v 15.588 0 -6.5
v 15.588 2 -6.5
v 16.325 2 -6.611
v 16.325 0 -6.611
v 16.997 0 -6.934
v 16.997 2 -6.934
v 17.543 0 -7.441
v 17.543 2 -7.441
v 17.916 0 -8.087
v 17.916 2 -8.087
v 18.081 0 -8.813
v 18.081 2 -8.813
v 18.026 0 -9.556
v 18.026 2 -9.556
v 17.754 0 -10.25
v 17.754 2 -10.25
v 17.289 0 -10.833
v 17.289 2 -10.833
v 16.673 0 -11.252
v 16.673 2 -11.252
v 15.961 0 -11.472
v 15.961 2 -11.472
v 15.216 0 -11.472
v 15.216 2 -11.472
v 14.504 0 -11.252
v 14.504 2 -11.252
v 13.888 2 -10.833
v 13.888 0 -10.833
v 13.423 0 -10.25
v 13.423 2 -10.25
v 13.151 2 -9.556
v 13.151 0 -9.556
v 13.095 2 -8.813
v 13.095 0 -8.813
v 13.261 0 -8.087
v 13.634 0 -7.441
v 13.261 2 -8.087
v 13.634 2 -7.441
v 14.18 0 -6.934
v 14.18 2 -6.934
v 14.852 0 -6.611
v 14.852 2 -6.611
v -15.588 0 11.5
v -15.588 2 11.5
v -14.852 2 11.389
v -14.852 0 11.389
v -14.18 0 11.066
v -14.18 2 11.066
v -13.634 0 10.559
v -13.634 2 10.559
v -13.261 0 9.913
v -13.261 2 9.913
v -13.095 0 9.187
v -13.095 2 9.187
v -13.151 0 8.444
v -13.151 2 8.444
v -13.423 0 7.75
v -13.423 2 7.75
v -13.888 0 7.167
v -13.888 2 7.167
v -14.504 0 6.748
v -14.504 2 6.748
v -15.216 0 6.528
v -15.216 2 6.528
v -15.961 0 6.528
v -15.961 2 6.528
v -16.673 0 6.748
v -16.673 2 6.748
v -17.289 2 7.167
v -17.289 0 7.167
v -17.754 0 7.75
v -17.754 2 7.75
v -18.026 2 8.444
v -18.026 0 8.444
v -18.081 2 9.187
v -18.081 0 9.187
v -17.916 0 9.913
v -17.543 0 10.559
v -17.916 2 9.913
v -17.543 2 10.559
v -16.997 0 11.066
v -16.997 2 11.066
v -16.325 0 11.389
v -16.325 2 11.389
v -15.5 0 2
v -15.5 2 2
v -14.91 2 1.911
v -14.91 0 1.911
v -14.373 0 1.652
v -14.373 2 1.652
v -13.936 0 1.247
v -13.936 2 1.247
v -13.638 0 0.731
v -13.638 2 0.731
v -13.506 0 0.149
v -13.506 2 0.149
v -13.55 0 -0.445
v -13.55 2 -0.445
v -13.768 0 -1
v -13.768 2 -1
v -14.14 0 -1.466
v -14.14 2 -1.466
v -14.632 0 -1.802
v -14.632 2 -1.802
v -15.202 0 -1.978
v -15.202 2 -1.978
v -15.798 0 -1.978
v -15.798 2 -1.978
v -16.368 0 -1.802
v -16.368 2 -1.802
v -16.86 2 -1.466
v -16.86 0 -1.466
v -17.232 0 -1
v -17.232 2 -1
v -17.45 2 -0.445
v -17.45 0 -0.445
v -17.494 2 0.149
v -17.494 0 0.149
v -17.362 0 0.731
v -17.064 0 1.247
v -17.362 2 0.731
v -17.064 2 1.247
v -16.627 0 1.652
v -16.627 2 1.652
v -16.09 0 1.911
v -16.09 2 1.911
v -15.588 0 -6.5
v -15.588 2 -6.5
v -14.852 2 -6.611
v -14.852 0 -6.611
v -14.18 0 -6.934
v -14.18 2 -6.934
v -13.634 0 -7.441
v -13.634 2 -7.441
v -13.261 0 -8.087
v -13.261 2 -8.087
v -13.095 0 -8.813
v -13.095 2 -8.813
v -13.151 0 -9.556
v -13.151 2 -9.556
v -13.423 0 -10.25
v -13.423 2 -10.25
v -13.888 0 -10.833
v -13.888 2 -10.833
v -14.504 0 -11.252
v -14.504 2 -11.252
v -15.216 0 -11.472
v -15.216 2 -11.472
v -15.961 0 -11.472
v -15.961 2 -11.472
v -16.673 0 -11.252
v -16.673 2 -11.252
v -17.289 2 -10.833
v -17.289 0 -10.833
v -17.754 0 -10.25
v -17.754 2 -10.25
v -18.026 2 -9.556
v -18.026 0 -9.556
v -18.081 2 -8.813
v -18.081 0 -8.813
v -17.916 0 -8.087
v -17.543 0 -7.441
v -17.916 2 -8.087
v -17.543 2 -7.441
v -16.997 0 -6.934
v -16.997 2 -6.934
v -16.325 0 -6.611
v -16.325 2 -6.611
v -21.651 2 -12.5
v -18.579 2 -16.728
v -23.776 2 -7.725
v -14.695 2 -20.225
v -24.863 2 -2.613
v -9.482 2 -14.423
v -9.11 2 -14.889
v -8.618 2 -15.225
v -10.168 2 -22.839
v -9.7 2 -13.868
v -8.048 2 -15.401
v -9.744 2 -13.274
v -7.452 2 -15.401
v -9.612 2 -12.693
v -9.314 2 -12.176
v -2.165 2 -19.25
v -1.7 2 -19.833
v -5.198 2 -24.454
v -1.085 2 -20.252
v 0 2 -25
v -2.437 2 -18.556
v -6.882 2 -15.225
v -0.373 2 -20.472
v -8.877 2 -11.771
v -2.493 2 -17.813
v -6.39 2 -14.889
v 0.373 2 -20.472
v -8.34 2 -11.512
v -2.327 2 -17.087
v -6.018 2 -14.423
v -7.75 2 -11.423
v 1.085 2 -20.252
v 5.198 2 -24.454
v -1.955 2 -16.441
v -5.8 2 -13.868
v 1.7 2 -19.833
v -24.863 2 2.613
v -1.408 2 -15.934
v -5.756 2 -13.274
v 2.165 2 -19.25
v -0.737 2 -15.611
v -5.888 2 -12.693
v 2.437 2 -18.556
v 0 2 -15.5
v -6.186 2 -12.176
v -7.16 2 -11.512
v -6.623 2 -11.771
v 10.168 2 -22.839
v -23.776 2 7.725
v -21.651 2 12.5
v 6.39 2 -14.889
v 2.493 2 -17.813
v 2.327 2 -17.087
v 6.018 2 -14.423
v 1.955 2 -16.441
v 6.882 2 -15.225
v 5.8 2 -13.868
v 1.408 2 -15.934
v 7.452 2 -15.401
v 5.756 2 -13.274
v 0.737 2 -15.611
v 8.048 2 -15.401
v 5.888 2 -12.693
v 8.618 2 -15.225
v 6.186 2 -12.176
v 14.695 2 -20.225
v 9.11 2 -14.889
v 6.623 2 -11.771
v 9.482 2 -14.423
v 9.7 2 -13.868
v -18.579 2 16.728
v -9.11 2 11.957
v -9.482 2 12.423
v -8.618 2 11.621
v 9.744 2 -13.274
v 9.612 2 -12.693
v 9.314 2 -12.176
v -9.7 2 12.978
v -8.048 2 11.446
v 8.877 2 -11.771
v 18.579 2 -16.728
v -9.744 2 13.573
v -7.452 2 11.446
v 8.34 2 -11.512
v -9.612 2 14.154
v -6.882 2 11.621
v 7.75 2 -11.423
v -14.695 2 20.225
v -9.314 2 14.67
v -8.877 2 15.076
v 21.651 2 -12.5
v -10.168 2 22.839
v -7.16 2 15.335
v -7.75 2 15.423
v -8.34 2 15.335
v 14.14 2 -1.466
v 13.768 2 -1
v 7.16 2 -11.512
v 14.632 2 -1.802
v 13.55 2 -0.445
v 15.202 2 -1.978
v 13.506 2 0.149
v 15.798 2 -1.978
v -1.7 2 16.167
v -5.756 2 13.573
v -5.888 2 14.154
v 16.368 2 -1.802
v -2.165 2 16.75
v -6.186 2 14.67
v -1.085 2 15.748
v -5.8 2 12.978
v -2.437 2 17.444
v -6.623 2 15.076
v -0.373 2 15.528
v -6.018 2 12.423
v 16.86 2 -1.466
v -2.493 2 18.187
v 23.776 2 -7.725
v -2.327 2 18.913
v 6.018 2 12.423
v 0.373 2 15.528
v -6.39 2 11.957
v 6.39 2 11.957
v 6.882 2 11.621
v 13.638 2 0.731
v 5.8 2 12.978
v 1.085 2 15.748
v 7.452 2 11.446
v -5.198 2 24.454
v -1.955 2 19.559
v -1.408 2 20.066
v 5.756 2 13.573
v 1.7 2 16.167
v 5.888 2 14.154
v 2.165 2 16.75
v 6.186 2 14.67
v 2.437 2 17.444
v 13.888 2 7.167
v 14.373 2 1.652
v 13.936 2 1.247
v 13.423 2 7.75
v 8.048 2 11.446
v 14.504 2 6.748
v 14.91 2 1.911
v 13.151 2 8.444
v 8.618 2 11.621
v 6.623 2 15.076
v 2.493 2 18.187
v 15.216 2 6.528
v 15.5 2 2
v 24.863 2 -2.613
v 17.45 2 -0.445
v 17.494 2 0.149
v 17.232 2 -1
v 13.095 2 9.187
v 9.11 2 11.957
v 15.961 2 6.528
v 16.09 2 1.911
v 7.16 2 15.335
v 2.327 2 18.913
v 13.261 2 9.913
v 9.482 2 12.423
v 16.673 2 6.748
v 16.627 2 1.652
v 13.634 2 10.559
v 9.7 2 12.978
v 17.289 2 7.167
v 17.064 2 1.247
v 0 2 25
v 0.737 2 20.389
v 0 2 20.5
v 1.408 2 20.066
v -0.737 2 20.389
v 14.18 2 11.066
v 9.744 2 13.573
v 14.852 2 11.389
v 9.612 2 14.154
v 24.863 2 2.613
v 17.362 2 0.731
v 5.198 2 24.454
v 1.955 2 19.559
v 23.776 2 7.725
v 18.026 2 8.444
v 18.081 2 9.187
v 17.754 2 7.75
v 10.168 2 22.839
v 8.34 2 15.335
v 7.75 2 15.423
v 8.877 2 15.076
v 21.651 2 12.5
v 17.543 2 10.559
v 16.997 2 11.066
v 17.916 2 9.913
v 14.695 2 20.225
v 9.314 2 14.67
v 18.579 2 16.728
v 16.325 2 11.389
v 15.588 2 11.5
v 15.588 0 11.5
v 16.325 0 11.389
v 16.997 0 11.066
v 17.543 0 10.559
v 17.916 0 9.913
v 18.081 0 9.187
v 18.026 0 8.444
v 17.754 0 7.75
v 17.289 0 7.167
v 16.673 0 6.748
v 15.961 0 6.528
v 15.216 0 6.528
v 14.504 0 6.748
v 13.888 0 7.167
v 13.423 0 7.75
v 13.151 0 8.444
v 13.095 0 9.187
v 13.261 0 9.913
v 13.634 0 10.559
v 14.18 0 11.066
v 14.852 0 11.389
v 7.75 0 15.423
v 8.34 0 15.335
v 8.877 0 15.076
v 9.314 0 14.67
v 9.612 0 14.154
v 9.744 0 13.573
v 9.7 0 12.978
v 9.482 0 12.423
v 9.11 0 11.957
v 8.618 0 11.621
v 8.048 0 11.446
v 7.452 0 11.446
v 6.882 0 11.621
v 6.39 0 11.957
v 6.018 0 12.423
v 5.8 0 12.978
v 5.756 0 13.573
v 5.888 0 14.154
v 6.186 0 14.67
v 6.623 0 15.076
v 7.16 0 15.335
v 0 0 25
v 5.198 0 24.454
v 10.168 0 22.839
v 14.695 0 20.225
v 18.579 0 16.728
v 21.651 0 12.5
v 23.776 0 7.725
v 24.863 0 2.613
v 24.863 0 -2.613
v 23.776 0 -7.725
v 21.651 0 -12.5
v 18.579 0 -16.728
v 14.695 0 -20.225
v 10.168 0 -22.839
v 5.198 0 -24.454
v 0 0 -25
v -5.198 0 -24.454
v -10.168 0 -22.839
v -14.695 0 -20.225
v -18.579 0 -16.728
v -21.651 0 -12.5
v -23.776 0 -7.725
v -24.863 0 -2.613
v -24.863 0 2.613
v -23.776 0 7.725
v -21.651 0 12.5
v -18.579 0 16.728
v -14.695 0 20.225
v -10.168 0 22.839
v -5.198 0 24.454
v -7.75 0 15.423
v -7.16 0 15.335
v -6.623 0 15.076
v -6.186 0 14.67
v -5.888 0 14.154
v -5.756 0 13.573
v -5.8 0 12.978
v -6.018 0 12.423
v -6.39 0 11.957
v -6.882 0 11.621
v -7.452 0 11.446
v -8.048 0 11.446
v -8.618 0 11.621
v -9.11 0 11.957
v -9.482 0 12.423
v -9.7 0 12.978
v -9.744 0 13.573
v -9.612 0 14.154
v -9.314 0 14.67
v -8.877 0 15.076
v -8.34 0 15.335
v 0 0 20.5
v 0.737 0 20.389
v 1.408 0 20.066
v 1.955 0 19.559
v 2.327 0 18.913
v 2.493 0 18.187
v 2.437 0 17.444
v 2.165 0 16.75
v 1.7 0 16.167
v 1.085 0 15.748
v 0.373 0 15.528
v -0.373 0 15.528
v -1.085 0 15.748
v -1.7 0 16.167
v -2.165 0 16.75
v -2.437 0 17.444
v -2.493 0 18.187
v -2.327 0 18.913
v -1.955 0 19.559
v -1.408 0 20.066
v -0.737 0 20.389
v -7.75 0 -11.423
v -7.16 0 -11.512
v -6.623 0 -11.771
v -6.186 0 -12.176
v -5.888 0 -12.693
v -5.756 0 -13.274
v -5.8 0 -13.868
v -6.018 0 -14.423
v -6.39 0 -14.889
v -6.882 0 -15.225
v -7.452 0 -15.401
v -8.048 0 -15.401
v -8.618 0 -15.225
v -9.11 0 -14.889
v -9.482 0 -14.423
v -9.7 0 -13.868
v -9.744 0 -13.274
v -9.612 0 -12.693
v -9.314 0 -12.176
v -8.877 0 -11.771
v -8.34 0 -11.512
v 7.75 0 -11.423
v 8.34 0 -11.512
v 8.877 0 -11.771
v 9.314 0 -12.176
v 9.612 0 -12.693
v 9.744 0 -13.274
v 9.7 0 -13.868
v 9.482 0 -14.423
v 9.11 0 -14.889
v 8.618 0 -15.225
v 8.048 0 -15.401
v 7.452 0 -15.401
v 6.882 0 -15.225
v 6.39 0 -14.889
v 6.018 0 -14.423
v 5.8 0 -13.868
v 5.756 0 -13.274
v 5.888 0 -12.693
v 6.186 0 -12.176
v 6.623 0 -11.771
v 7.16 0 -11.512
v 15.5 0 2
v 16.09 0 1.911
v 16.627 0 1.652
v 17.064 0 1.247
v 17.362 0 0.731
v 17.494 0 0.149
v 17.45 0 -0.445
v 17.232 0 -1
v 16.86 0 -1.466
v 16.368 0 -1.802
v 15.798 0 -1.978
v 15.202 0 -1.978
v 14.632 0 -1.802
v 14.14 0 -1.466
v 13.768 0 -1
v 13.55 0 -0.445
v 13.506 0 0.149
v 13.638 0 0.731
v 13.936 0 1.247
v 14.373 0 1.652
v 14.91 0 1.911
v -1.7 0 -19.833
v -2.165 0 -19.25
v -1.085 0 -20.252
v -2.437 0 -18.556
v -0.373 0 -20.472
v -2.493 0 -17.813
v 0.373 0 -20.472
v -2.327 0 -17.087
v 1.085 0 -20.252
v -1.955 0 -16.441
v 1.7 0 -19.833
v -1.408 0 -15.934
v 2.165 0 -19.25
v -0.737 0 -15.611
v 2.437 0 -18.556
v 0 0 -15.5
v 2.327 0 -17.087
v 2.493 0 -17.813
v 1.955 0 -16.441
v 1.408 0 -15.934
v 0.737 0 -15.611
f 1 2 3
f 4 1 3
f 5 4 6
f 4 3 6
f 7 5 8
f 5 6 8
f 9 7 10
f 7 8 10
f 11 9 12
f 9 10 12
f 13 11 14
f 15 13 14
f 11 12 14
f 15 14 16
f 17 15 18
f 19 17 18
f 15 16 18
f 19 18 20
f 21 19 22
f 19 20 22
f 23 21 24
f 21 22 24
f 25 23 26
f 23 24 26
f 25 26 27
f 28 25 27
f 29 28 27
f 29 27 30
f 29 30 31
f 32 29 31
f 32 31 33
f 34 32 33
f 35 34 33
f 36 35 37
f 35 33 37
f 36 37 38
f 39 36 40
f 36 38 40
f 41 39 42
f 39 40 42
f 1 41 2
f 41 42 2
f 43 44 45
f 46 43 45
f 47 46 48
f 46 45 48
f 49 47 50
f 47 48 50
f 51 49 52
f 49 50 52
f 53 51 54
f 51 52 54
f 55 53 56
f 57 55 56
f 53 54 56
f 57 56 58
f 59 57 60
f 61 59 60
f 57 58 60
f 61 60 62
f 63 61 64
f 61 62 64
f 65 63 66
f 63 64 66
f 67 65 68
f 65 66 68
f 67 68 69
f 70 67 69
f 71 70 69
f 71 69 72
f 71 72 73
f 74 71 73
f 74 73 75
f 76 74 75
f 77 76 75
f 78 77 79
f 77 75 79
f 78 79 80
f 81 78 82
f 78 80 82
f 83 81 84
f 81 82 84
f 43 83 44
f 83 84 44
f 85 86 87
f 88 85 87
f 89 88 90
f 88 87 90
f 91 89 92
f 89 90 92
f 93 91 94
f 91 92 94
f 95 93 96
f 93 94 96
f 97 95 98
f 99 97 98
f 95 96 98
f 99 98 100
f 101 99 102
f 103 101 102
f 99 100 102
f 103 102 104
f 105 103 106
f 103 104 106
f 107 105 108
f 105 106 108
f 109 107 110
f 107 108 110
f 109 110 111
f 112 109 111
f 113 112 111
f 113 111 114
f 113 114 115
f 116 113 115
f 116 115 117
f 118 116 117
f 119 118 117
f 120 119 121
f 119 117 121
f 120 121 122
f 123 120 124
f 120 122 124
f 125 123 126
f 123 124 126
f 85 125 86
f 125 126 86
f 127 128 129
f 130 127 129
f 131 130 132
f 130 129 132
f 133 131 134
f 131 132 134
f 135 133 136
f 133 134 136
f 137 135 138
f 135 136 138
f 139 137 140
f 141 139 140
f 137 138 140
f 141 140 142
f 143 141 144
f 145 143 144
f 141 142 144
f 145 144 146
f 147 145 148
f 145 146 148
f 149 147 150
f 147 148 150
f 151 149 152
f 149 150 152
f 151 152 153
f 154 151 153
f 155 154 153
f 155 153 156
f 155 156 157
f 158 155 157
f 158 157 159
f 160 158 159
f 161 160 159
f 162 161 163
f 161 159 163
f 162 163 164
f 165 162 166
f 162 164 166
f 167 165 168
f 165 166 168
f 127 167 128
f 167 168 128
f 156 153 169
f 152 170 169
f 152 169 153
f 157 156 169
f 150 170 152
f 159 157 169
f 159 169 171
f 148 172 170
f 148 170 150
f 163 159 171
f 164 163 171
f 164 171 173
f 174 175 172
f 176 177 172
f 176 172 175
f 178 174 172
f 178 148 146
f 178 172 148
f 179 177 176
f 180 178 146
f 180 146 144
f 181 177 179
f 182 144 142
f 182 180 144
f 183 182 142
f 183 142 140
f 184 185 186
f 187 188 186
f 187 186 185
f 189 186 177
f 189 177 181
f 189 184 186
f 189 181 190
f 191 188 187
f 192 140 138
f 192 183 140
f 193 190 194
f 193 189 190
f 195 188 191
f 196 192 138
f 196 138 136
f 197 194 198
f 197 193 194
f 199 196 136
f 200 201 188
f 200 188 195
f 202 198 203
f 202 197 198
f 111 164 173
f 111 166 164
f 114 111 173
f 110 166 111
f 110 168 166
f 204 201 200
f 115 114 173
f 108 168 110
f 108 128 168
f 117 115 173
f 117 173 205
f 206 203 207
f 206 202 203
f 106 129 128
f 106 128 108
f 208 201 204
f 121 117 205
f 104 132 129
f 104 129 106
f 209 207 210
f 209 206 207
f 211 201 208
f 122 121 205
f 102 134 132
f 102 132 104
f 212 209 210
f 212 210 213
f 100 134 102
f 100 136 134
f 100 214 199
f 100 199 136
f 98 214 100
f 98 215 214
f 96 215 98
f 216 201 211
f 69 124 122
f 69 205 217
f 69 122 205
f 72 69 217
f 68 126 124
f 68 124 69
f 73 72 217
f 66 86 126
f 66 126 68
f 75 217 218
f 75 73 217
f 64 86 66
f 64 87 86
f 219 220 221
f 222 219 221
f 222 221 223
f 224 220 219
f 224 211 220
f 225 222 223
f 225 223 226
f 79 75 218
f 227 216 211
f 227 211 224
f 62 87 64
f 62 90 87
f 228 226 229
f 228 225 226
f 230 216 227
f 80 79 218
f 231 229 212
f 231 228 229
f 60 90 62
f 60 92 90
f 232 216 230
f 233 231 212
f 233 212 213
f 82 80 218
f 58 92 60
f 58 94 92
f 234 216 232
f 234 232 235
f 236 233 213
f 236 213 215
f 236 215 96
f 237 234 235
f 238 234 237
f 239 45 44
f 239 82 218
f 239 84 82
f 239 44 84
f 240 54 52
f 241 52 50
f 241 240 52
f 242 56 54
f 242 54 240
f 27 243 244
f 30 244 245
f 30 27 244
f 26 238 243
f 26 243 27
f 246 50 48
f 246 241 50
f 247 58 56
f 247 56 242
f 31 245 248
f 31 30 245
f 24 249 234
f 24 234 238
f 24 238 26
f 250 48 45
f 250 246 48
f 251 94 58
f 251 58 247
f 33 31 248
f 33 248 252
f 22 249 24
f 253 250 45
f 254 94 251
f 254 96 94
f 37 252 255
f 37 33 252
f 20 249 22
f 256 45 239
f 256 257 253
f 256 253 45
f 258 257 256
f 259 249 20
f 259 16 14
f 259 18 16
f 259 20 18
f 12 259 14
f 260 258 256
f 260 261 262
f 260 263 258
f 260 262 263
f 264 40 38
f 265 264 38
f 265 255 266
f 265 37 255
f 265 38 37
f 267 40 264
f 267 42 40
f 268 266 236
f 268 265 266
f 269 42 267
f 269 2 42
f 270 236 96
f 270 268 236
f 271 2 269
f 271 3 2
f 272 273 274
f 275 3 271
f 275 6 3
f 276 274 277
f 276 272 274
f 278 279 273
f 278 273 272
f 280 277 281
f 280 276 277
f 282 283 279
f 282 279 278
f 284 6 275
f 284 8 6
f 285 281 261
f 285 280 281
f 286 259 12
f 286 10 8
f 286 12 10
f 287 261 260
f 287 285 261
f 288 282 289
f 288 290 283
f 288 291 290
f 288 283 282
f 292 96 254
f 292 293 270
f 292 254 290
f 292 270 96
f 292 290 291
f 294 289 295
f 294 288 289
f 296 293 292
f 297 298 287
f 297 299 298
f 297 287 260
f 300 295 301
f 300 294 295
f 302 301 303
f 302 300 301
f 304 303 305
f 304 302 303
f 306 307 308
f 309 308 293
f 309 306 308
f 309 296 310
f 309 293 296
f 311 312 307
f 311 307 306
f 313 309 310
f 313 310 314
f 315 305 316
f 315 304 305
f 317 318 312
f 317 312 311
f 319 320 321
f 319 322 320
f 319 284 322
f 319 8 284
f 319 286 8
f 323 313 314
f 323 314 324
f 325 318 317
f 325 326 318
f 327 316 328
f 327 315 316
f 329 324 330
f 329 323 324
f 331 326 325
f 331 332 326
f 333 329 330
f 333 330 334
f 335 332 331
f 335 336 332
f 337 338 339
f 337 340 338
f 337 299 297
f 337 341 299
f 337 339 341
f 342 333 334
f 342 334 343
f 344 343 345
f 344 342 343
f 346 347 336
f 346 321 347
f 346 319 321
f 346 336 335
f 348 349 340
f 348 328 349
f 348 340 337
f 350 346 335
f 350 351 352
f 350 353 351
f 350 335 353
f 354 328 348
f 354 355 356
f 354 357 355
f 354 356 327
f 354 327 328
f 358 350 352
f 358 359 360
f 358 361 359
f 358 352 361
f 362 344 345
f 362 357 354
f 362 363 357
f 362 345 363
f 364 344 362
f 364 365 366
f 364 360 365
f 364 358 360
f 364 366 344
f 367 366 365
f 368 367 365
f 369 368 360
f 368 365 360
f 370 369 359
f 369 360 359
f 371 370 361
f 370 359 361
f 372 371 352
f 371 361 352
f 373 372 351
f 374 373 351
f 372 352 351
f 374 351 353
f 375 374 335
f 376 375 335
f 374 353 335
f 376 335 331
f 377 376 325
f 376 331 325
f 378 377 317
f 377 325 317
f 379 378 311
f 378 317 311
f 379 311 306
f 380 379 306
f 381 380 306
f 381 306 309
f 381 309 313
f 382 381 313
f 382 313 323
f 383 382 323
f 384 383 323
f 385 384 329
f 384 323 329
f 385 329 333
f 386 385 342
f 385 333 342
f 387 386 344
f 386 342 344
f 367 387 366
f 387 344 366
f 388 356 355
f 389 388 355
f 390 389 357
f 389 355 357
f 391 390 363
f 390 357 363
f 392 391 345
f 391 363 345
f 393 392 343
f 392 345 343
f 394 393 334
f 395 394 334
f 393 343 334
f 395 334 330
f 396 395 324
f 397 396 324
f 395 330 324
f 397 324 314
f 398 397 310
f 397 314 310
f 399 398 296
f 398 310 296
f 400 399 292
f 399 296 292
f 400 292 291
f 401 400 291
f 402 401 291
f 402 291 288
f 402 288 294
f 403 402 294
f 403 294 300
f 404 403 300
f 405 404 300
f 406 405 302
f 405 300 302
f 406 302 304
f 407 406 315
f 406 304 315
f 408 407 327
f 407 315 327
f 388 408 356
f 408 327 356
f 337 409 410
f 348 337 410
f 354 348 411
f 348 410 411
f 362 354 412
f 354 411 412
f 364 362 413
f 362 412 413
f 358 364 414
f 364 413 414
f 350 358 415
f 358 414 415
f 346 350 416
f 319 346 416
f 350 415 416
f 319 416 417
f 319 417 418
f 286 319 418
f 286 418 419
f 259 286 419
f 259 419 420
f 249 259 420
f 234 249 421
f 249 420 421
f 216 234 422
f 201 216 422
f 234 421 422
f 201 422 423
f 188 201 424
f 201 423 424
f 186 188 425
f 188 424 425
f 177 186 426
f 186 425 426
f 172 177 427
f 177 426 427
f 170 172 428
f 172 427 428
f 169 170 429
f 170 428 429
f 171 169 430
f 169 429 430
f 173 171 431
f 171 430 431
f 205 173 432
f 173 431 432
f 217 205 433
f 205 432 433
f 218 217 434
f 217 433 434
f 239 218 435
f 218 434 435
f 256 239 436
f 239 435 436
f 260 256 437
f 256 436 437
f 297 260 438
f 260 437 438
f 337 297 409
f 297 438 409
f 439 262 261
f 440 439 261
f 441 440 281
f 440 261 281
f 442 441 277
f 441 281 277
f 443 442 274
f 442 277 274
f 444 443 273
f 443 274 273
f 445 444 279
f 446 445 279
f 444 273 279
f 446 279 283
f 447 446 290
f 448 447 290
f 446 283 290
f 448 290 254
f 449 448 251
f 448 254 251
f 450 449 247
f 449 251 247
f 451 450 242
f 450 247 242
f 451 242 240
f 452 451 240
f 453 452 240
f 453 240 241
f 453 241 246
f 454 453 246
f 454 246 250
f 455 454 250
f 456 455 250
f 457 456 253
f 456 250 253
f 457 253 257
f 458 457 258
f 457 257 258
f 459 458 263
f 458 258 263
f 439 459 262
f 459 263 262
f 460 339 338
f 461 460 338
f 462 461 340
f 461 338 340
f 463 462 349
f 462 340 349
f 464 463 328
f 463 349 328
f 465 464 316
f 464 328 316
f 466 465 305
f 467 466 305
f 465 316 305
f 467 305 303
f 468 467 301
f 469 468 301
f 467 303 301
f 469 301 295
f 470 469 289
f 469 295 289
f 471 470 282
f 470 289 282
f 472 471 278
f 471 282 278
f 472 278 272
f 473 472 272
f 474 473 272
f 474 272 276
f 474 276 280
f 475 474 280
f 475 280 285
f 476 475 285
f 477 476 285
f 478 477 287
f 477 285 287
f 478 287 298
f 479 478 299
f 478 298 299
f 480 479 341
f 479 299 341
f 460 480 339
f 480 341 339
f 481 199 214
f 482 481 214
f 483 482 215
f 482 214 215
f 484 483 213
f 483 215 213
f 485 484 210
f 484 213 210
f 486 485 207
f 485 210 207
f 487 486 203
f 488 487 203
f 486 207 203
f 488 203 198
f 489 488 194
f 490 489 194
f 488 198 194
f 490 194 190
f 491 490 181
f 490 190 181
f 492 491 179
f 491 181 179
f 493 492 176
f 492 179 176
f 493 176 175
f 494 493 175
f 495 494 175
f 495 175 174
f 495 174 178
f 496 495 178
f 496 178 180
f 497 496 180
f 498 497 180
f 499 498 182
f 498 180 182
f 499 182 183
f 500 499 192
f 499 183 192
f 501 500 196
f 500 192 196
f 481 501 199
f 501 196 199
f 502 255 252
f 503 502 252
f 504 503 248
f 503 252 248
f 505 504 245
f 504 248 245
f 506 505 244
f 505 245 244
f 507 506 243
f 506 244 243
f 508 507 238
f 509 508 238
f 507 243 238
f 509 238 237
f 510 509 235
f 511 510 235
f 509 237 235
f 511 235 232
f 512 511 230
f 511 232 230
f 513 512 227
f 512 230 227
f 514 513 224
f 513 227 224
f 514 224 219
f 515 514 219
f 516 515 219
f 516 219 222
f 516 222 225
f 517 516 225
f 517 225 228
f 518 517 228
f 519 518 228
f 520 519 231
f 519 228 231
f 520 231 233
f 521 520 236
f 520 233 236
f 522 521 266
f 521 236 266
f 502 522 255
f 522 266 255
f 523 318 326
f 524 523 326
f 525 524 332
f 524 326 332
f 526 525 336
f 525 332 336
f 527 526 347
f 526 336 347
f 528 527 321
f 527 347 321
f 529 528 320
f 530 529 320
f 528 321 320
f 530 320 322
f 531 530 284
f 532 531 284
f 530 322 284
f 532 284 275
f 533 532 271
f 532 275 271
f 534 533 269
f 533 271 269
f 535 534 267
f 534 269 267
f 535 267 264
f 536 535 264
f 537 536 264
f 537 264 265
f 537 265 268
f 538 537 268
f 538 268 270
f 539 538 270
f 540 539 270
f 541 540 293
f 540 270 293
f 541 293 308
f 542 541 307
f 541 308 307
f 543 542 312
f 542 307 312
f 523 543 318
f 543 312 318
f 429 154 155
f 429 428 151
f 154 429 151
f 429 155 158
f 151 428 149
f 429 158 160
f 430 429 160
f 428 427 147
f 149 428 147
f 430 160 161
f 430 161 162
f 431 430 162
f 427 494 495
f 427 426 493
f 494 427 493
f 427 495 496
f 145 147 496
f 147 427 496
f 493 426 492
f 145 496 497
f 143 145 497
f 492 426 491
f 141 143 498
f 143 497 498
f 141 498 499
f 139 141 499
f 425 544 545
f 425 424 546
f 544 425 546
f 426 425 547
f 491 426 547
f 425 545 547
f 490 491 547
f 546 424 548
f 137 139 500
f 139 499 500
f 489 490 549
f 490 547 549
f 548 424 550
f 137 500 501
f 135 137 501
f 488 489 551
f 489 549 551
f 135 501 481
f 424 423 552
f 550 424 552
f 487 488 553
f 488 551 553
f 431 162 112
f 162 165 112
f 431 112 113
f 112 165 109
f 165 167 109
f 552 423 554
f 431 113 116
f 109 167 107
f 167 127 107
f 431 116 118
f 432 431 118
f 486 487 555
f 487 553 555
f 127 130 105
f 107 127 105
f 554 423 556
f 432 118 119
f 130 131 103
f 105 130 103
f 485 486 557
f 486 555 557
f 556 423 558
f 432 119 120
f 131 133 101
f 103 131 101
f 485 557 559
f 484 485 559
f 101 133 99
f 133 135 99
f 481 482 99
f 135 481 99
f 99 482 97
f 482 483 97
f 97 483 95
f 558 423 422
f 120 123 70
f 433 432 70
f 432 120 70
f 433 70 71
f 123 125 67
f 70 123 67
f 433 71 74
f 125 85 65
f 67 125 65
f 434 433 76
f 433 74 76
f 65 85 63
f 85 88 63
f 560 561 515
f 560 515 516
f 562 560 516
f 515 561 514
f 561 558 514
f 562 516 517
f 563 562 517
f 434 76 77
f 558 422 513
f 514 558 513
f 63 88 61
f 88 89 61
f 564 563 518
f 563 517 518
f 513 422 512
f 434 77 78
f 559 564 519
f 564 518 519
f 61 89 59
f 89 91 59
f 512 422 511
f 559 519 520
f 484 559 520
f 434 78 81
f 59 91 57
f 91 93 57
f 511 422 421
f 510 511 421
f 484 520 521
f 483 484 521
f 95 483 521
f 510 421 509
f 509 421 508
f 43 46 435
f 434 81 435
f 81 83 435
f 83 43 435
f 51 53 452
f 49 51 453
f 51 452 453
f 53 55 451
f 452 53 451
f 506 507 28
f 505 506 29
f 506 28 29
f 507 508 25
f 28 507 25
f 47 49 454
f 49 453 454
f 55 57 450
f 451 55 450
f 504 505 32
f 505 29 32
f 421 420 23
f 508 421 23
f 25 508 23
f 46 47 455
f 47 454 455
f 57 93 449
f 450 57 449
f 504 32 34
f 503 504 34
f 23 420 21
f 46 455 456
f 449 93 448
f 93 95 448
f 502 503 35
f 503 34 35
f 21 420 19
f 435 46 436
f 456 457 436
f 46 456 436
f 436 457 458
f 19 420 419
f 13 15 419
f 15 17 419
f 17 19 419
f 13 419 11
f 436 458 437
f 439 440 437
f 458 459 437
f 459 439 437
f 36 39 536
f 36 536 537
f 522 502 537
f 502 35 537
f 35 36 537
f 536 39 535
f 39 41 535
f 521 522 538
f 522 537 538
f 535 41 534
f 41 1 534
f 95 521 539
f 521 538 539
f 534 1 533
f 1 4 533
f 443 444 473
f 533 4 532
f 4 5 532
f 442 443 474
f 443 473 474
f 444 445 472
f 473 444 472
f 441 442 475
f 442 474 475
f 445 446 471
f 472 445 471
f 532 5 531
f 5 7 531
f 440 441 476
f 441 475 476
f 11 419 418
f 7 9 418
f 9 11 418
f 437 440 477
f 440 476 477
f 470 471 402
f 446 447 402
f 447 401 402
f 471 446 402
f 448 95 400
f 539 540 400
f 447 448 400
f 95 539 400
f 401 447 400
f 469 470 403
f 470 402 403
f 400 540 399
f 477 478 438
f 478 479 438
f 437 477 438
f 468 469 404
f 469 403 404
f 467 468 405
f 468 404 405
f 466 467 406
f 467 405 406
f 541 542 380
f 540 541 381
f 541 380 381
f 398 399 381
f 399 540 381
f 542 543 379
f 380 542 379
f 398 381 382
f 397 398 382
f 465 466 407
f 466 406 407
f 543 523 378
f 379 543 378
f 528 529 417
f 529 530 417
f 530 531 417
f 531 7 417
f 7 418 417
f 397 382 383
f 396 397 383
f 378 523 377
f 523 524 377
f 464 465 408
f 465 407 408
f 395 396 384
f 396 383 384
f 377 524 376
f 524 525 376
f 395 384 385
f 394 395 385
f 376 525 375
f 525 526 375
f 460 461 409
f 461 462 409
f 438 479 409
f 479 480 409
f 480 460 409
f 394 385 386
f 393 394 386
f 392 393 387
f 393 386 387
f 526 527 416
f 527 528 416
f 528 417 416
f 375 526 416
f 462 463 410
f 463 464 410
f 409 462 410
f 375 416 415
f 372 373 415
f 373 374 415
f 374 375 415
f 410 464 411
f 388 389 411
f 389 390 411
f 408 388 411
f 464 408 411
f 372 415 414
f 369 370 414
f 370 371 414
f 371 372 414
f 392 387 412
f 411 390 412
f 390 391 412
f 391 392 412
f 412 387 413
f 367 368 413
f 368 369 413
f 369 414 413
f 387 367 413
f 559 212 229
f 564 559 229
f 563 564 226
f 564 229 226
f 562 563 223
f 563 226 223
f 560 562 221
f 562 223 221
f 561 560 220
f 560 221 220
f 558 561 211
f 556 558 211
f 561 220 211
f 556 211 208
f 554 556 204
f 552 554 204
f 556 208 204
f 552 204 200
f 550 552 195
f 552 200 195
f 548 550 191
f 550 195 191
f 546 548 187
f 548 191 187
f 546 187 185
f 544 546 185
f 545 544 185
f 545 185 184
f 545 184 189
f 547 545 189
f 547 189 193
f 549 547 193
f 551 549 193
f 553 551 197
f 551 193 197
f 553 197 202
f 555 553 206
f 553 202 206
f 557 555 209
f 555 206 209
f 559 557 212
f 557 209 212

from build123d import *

# Parameters (mm, degrees)
SKETCH_1_R          = 25
EXTRUDE_1_DEPTH     = 2
SKETCH_2_R          = 2.5
SKETCH_2_R_2        = 2
CUT_EXTRUDE_1_DEPTH = 2


with BuildPart() as part:
    # Эскиз1 → Бобышка-Вытянуть1 (new body)
    with BuildSketch(Plane(origin=(0, 0, 0), x_dir=(1, 0, 0), z_dir=(0, 1, 0))):
        with Locations(Location((0, 0, 0), (0, 0, 270))):
            Circle(SKETCH_1_R)
    extrude(amount=EXTRUDE_1_DEPTH)

    # Эскиз2 → Вырез-Вытянуть1 (cut)
    with BuildSketch(Plane(origin=(0, 2, 0), x_dir=(1, 0, 0), z_dir=(0, 1, 0))):
        with Locations(Location((0, 18, 0), (0, 0, 270))):
            Circle(SKETCH_2_R)
        with Locations(Location((15.588457268, 9, 0), (0, 0, 270))):
            Circle(SKETCH_2_R)
        with Locations(Location((15.588457268, -9, 0), (0, 0, 270))):
            Circle(SKETCH_2_R)
        with Locations(Location((0, -18, 0), (0, 0, 270))):
            Circle(SKETCH_2_R)
        with Locations(Location((-15.588457268, -9, 0), (0, 0, 270))):
            Circle(SKETCH_2_R)
        with Locations(Location((-15.588457268, 9, 0), (0, 0, 270))):
            Circle(SKETCH_2_R)
        with Locations(Location((-15.5, 0, 0), (0, 0, 270))):
            Circle(SKETCH_2_R_2)
        with Locations(Location((-7.75, 13.423393759, 0), (0, 0, 270))):
            Circle(SKETCH_2_R_2)
        with Locations(Location((7.75, 13.423393759, 0), (0, 0, 270))):
            Circle(SKETCH_2_R_2)
        with Locations(Location((15.5, 0, 0), (0, 0, 270))):
            Circle(SKETCH_2_R_2)
        with Locations(Location((7.75, -13.423393759, 0), (0, 0, 270))):
            Circle(SKETCH_2_R_2)
        with Locations(Location((-7.75, -13.423393759, 0), (0, 0, 270))):
            Circle(SKETCH_2_R_2)
    extrude(amount=-CUT_EXTRUDE_1_DEPTH, mode=Mode.SUBTRACT)


solid = part.part
